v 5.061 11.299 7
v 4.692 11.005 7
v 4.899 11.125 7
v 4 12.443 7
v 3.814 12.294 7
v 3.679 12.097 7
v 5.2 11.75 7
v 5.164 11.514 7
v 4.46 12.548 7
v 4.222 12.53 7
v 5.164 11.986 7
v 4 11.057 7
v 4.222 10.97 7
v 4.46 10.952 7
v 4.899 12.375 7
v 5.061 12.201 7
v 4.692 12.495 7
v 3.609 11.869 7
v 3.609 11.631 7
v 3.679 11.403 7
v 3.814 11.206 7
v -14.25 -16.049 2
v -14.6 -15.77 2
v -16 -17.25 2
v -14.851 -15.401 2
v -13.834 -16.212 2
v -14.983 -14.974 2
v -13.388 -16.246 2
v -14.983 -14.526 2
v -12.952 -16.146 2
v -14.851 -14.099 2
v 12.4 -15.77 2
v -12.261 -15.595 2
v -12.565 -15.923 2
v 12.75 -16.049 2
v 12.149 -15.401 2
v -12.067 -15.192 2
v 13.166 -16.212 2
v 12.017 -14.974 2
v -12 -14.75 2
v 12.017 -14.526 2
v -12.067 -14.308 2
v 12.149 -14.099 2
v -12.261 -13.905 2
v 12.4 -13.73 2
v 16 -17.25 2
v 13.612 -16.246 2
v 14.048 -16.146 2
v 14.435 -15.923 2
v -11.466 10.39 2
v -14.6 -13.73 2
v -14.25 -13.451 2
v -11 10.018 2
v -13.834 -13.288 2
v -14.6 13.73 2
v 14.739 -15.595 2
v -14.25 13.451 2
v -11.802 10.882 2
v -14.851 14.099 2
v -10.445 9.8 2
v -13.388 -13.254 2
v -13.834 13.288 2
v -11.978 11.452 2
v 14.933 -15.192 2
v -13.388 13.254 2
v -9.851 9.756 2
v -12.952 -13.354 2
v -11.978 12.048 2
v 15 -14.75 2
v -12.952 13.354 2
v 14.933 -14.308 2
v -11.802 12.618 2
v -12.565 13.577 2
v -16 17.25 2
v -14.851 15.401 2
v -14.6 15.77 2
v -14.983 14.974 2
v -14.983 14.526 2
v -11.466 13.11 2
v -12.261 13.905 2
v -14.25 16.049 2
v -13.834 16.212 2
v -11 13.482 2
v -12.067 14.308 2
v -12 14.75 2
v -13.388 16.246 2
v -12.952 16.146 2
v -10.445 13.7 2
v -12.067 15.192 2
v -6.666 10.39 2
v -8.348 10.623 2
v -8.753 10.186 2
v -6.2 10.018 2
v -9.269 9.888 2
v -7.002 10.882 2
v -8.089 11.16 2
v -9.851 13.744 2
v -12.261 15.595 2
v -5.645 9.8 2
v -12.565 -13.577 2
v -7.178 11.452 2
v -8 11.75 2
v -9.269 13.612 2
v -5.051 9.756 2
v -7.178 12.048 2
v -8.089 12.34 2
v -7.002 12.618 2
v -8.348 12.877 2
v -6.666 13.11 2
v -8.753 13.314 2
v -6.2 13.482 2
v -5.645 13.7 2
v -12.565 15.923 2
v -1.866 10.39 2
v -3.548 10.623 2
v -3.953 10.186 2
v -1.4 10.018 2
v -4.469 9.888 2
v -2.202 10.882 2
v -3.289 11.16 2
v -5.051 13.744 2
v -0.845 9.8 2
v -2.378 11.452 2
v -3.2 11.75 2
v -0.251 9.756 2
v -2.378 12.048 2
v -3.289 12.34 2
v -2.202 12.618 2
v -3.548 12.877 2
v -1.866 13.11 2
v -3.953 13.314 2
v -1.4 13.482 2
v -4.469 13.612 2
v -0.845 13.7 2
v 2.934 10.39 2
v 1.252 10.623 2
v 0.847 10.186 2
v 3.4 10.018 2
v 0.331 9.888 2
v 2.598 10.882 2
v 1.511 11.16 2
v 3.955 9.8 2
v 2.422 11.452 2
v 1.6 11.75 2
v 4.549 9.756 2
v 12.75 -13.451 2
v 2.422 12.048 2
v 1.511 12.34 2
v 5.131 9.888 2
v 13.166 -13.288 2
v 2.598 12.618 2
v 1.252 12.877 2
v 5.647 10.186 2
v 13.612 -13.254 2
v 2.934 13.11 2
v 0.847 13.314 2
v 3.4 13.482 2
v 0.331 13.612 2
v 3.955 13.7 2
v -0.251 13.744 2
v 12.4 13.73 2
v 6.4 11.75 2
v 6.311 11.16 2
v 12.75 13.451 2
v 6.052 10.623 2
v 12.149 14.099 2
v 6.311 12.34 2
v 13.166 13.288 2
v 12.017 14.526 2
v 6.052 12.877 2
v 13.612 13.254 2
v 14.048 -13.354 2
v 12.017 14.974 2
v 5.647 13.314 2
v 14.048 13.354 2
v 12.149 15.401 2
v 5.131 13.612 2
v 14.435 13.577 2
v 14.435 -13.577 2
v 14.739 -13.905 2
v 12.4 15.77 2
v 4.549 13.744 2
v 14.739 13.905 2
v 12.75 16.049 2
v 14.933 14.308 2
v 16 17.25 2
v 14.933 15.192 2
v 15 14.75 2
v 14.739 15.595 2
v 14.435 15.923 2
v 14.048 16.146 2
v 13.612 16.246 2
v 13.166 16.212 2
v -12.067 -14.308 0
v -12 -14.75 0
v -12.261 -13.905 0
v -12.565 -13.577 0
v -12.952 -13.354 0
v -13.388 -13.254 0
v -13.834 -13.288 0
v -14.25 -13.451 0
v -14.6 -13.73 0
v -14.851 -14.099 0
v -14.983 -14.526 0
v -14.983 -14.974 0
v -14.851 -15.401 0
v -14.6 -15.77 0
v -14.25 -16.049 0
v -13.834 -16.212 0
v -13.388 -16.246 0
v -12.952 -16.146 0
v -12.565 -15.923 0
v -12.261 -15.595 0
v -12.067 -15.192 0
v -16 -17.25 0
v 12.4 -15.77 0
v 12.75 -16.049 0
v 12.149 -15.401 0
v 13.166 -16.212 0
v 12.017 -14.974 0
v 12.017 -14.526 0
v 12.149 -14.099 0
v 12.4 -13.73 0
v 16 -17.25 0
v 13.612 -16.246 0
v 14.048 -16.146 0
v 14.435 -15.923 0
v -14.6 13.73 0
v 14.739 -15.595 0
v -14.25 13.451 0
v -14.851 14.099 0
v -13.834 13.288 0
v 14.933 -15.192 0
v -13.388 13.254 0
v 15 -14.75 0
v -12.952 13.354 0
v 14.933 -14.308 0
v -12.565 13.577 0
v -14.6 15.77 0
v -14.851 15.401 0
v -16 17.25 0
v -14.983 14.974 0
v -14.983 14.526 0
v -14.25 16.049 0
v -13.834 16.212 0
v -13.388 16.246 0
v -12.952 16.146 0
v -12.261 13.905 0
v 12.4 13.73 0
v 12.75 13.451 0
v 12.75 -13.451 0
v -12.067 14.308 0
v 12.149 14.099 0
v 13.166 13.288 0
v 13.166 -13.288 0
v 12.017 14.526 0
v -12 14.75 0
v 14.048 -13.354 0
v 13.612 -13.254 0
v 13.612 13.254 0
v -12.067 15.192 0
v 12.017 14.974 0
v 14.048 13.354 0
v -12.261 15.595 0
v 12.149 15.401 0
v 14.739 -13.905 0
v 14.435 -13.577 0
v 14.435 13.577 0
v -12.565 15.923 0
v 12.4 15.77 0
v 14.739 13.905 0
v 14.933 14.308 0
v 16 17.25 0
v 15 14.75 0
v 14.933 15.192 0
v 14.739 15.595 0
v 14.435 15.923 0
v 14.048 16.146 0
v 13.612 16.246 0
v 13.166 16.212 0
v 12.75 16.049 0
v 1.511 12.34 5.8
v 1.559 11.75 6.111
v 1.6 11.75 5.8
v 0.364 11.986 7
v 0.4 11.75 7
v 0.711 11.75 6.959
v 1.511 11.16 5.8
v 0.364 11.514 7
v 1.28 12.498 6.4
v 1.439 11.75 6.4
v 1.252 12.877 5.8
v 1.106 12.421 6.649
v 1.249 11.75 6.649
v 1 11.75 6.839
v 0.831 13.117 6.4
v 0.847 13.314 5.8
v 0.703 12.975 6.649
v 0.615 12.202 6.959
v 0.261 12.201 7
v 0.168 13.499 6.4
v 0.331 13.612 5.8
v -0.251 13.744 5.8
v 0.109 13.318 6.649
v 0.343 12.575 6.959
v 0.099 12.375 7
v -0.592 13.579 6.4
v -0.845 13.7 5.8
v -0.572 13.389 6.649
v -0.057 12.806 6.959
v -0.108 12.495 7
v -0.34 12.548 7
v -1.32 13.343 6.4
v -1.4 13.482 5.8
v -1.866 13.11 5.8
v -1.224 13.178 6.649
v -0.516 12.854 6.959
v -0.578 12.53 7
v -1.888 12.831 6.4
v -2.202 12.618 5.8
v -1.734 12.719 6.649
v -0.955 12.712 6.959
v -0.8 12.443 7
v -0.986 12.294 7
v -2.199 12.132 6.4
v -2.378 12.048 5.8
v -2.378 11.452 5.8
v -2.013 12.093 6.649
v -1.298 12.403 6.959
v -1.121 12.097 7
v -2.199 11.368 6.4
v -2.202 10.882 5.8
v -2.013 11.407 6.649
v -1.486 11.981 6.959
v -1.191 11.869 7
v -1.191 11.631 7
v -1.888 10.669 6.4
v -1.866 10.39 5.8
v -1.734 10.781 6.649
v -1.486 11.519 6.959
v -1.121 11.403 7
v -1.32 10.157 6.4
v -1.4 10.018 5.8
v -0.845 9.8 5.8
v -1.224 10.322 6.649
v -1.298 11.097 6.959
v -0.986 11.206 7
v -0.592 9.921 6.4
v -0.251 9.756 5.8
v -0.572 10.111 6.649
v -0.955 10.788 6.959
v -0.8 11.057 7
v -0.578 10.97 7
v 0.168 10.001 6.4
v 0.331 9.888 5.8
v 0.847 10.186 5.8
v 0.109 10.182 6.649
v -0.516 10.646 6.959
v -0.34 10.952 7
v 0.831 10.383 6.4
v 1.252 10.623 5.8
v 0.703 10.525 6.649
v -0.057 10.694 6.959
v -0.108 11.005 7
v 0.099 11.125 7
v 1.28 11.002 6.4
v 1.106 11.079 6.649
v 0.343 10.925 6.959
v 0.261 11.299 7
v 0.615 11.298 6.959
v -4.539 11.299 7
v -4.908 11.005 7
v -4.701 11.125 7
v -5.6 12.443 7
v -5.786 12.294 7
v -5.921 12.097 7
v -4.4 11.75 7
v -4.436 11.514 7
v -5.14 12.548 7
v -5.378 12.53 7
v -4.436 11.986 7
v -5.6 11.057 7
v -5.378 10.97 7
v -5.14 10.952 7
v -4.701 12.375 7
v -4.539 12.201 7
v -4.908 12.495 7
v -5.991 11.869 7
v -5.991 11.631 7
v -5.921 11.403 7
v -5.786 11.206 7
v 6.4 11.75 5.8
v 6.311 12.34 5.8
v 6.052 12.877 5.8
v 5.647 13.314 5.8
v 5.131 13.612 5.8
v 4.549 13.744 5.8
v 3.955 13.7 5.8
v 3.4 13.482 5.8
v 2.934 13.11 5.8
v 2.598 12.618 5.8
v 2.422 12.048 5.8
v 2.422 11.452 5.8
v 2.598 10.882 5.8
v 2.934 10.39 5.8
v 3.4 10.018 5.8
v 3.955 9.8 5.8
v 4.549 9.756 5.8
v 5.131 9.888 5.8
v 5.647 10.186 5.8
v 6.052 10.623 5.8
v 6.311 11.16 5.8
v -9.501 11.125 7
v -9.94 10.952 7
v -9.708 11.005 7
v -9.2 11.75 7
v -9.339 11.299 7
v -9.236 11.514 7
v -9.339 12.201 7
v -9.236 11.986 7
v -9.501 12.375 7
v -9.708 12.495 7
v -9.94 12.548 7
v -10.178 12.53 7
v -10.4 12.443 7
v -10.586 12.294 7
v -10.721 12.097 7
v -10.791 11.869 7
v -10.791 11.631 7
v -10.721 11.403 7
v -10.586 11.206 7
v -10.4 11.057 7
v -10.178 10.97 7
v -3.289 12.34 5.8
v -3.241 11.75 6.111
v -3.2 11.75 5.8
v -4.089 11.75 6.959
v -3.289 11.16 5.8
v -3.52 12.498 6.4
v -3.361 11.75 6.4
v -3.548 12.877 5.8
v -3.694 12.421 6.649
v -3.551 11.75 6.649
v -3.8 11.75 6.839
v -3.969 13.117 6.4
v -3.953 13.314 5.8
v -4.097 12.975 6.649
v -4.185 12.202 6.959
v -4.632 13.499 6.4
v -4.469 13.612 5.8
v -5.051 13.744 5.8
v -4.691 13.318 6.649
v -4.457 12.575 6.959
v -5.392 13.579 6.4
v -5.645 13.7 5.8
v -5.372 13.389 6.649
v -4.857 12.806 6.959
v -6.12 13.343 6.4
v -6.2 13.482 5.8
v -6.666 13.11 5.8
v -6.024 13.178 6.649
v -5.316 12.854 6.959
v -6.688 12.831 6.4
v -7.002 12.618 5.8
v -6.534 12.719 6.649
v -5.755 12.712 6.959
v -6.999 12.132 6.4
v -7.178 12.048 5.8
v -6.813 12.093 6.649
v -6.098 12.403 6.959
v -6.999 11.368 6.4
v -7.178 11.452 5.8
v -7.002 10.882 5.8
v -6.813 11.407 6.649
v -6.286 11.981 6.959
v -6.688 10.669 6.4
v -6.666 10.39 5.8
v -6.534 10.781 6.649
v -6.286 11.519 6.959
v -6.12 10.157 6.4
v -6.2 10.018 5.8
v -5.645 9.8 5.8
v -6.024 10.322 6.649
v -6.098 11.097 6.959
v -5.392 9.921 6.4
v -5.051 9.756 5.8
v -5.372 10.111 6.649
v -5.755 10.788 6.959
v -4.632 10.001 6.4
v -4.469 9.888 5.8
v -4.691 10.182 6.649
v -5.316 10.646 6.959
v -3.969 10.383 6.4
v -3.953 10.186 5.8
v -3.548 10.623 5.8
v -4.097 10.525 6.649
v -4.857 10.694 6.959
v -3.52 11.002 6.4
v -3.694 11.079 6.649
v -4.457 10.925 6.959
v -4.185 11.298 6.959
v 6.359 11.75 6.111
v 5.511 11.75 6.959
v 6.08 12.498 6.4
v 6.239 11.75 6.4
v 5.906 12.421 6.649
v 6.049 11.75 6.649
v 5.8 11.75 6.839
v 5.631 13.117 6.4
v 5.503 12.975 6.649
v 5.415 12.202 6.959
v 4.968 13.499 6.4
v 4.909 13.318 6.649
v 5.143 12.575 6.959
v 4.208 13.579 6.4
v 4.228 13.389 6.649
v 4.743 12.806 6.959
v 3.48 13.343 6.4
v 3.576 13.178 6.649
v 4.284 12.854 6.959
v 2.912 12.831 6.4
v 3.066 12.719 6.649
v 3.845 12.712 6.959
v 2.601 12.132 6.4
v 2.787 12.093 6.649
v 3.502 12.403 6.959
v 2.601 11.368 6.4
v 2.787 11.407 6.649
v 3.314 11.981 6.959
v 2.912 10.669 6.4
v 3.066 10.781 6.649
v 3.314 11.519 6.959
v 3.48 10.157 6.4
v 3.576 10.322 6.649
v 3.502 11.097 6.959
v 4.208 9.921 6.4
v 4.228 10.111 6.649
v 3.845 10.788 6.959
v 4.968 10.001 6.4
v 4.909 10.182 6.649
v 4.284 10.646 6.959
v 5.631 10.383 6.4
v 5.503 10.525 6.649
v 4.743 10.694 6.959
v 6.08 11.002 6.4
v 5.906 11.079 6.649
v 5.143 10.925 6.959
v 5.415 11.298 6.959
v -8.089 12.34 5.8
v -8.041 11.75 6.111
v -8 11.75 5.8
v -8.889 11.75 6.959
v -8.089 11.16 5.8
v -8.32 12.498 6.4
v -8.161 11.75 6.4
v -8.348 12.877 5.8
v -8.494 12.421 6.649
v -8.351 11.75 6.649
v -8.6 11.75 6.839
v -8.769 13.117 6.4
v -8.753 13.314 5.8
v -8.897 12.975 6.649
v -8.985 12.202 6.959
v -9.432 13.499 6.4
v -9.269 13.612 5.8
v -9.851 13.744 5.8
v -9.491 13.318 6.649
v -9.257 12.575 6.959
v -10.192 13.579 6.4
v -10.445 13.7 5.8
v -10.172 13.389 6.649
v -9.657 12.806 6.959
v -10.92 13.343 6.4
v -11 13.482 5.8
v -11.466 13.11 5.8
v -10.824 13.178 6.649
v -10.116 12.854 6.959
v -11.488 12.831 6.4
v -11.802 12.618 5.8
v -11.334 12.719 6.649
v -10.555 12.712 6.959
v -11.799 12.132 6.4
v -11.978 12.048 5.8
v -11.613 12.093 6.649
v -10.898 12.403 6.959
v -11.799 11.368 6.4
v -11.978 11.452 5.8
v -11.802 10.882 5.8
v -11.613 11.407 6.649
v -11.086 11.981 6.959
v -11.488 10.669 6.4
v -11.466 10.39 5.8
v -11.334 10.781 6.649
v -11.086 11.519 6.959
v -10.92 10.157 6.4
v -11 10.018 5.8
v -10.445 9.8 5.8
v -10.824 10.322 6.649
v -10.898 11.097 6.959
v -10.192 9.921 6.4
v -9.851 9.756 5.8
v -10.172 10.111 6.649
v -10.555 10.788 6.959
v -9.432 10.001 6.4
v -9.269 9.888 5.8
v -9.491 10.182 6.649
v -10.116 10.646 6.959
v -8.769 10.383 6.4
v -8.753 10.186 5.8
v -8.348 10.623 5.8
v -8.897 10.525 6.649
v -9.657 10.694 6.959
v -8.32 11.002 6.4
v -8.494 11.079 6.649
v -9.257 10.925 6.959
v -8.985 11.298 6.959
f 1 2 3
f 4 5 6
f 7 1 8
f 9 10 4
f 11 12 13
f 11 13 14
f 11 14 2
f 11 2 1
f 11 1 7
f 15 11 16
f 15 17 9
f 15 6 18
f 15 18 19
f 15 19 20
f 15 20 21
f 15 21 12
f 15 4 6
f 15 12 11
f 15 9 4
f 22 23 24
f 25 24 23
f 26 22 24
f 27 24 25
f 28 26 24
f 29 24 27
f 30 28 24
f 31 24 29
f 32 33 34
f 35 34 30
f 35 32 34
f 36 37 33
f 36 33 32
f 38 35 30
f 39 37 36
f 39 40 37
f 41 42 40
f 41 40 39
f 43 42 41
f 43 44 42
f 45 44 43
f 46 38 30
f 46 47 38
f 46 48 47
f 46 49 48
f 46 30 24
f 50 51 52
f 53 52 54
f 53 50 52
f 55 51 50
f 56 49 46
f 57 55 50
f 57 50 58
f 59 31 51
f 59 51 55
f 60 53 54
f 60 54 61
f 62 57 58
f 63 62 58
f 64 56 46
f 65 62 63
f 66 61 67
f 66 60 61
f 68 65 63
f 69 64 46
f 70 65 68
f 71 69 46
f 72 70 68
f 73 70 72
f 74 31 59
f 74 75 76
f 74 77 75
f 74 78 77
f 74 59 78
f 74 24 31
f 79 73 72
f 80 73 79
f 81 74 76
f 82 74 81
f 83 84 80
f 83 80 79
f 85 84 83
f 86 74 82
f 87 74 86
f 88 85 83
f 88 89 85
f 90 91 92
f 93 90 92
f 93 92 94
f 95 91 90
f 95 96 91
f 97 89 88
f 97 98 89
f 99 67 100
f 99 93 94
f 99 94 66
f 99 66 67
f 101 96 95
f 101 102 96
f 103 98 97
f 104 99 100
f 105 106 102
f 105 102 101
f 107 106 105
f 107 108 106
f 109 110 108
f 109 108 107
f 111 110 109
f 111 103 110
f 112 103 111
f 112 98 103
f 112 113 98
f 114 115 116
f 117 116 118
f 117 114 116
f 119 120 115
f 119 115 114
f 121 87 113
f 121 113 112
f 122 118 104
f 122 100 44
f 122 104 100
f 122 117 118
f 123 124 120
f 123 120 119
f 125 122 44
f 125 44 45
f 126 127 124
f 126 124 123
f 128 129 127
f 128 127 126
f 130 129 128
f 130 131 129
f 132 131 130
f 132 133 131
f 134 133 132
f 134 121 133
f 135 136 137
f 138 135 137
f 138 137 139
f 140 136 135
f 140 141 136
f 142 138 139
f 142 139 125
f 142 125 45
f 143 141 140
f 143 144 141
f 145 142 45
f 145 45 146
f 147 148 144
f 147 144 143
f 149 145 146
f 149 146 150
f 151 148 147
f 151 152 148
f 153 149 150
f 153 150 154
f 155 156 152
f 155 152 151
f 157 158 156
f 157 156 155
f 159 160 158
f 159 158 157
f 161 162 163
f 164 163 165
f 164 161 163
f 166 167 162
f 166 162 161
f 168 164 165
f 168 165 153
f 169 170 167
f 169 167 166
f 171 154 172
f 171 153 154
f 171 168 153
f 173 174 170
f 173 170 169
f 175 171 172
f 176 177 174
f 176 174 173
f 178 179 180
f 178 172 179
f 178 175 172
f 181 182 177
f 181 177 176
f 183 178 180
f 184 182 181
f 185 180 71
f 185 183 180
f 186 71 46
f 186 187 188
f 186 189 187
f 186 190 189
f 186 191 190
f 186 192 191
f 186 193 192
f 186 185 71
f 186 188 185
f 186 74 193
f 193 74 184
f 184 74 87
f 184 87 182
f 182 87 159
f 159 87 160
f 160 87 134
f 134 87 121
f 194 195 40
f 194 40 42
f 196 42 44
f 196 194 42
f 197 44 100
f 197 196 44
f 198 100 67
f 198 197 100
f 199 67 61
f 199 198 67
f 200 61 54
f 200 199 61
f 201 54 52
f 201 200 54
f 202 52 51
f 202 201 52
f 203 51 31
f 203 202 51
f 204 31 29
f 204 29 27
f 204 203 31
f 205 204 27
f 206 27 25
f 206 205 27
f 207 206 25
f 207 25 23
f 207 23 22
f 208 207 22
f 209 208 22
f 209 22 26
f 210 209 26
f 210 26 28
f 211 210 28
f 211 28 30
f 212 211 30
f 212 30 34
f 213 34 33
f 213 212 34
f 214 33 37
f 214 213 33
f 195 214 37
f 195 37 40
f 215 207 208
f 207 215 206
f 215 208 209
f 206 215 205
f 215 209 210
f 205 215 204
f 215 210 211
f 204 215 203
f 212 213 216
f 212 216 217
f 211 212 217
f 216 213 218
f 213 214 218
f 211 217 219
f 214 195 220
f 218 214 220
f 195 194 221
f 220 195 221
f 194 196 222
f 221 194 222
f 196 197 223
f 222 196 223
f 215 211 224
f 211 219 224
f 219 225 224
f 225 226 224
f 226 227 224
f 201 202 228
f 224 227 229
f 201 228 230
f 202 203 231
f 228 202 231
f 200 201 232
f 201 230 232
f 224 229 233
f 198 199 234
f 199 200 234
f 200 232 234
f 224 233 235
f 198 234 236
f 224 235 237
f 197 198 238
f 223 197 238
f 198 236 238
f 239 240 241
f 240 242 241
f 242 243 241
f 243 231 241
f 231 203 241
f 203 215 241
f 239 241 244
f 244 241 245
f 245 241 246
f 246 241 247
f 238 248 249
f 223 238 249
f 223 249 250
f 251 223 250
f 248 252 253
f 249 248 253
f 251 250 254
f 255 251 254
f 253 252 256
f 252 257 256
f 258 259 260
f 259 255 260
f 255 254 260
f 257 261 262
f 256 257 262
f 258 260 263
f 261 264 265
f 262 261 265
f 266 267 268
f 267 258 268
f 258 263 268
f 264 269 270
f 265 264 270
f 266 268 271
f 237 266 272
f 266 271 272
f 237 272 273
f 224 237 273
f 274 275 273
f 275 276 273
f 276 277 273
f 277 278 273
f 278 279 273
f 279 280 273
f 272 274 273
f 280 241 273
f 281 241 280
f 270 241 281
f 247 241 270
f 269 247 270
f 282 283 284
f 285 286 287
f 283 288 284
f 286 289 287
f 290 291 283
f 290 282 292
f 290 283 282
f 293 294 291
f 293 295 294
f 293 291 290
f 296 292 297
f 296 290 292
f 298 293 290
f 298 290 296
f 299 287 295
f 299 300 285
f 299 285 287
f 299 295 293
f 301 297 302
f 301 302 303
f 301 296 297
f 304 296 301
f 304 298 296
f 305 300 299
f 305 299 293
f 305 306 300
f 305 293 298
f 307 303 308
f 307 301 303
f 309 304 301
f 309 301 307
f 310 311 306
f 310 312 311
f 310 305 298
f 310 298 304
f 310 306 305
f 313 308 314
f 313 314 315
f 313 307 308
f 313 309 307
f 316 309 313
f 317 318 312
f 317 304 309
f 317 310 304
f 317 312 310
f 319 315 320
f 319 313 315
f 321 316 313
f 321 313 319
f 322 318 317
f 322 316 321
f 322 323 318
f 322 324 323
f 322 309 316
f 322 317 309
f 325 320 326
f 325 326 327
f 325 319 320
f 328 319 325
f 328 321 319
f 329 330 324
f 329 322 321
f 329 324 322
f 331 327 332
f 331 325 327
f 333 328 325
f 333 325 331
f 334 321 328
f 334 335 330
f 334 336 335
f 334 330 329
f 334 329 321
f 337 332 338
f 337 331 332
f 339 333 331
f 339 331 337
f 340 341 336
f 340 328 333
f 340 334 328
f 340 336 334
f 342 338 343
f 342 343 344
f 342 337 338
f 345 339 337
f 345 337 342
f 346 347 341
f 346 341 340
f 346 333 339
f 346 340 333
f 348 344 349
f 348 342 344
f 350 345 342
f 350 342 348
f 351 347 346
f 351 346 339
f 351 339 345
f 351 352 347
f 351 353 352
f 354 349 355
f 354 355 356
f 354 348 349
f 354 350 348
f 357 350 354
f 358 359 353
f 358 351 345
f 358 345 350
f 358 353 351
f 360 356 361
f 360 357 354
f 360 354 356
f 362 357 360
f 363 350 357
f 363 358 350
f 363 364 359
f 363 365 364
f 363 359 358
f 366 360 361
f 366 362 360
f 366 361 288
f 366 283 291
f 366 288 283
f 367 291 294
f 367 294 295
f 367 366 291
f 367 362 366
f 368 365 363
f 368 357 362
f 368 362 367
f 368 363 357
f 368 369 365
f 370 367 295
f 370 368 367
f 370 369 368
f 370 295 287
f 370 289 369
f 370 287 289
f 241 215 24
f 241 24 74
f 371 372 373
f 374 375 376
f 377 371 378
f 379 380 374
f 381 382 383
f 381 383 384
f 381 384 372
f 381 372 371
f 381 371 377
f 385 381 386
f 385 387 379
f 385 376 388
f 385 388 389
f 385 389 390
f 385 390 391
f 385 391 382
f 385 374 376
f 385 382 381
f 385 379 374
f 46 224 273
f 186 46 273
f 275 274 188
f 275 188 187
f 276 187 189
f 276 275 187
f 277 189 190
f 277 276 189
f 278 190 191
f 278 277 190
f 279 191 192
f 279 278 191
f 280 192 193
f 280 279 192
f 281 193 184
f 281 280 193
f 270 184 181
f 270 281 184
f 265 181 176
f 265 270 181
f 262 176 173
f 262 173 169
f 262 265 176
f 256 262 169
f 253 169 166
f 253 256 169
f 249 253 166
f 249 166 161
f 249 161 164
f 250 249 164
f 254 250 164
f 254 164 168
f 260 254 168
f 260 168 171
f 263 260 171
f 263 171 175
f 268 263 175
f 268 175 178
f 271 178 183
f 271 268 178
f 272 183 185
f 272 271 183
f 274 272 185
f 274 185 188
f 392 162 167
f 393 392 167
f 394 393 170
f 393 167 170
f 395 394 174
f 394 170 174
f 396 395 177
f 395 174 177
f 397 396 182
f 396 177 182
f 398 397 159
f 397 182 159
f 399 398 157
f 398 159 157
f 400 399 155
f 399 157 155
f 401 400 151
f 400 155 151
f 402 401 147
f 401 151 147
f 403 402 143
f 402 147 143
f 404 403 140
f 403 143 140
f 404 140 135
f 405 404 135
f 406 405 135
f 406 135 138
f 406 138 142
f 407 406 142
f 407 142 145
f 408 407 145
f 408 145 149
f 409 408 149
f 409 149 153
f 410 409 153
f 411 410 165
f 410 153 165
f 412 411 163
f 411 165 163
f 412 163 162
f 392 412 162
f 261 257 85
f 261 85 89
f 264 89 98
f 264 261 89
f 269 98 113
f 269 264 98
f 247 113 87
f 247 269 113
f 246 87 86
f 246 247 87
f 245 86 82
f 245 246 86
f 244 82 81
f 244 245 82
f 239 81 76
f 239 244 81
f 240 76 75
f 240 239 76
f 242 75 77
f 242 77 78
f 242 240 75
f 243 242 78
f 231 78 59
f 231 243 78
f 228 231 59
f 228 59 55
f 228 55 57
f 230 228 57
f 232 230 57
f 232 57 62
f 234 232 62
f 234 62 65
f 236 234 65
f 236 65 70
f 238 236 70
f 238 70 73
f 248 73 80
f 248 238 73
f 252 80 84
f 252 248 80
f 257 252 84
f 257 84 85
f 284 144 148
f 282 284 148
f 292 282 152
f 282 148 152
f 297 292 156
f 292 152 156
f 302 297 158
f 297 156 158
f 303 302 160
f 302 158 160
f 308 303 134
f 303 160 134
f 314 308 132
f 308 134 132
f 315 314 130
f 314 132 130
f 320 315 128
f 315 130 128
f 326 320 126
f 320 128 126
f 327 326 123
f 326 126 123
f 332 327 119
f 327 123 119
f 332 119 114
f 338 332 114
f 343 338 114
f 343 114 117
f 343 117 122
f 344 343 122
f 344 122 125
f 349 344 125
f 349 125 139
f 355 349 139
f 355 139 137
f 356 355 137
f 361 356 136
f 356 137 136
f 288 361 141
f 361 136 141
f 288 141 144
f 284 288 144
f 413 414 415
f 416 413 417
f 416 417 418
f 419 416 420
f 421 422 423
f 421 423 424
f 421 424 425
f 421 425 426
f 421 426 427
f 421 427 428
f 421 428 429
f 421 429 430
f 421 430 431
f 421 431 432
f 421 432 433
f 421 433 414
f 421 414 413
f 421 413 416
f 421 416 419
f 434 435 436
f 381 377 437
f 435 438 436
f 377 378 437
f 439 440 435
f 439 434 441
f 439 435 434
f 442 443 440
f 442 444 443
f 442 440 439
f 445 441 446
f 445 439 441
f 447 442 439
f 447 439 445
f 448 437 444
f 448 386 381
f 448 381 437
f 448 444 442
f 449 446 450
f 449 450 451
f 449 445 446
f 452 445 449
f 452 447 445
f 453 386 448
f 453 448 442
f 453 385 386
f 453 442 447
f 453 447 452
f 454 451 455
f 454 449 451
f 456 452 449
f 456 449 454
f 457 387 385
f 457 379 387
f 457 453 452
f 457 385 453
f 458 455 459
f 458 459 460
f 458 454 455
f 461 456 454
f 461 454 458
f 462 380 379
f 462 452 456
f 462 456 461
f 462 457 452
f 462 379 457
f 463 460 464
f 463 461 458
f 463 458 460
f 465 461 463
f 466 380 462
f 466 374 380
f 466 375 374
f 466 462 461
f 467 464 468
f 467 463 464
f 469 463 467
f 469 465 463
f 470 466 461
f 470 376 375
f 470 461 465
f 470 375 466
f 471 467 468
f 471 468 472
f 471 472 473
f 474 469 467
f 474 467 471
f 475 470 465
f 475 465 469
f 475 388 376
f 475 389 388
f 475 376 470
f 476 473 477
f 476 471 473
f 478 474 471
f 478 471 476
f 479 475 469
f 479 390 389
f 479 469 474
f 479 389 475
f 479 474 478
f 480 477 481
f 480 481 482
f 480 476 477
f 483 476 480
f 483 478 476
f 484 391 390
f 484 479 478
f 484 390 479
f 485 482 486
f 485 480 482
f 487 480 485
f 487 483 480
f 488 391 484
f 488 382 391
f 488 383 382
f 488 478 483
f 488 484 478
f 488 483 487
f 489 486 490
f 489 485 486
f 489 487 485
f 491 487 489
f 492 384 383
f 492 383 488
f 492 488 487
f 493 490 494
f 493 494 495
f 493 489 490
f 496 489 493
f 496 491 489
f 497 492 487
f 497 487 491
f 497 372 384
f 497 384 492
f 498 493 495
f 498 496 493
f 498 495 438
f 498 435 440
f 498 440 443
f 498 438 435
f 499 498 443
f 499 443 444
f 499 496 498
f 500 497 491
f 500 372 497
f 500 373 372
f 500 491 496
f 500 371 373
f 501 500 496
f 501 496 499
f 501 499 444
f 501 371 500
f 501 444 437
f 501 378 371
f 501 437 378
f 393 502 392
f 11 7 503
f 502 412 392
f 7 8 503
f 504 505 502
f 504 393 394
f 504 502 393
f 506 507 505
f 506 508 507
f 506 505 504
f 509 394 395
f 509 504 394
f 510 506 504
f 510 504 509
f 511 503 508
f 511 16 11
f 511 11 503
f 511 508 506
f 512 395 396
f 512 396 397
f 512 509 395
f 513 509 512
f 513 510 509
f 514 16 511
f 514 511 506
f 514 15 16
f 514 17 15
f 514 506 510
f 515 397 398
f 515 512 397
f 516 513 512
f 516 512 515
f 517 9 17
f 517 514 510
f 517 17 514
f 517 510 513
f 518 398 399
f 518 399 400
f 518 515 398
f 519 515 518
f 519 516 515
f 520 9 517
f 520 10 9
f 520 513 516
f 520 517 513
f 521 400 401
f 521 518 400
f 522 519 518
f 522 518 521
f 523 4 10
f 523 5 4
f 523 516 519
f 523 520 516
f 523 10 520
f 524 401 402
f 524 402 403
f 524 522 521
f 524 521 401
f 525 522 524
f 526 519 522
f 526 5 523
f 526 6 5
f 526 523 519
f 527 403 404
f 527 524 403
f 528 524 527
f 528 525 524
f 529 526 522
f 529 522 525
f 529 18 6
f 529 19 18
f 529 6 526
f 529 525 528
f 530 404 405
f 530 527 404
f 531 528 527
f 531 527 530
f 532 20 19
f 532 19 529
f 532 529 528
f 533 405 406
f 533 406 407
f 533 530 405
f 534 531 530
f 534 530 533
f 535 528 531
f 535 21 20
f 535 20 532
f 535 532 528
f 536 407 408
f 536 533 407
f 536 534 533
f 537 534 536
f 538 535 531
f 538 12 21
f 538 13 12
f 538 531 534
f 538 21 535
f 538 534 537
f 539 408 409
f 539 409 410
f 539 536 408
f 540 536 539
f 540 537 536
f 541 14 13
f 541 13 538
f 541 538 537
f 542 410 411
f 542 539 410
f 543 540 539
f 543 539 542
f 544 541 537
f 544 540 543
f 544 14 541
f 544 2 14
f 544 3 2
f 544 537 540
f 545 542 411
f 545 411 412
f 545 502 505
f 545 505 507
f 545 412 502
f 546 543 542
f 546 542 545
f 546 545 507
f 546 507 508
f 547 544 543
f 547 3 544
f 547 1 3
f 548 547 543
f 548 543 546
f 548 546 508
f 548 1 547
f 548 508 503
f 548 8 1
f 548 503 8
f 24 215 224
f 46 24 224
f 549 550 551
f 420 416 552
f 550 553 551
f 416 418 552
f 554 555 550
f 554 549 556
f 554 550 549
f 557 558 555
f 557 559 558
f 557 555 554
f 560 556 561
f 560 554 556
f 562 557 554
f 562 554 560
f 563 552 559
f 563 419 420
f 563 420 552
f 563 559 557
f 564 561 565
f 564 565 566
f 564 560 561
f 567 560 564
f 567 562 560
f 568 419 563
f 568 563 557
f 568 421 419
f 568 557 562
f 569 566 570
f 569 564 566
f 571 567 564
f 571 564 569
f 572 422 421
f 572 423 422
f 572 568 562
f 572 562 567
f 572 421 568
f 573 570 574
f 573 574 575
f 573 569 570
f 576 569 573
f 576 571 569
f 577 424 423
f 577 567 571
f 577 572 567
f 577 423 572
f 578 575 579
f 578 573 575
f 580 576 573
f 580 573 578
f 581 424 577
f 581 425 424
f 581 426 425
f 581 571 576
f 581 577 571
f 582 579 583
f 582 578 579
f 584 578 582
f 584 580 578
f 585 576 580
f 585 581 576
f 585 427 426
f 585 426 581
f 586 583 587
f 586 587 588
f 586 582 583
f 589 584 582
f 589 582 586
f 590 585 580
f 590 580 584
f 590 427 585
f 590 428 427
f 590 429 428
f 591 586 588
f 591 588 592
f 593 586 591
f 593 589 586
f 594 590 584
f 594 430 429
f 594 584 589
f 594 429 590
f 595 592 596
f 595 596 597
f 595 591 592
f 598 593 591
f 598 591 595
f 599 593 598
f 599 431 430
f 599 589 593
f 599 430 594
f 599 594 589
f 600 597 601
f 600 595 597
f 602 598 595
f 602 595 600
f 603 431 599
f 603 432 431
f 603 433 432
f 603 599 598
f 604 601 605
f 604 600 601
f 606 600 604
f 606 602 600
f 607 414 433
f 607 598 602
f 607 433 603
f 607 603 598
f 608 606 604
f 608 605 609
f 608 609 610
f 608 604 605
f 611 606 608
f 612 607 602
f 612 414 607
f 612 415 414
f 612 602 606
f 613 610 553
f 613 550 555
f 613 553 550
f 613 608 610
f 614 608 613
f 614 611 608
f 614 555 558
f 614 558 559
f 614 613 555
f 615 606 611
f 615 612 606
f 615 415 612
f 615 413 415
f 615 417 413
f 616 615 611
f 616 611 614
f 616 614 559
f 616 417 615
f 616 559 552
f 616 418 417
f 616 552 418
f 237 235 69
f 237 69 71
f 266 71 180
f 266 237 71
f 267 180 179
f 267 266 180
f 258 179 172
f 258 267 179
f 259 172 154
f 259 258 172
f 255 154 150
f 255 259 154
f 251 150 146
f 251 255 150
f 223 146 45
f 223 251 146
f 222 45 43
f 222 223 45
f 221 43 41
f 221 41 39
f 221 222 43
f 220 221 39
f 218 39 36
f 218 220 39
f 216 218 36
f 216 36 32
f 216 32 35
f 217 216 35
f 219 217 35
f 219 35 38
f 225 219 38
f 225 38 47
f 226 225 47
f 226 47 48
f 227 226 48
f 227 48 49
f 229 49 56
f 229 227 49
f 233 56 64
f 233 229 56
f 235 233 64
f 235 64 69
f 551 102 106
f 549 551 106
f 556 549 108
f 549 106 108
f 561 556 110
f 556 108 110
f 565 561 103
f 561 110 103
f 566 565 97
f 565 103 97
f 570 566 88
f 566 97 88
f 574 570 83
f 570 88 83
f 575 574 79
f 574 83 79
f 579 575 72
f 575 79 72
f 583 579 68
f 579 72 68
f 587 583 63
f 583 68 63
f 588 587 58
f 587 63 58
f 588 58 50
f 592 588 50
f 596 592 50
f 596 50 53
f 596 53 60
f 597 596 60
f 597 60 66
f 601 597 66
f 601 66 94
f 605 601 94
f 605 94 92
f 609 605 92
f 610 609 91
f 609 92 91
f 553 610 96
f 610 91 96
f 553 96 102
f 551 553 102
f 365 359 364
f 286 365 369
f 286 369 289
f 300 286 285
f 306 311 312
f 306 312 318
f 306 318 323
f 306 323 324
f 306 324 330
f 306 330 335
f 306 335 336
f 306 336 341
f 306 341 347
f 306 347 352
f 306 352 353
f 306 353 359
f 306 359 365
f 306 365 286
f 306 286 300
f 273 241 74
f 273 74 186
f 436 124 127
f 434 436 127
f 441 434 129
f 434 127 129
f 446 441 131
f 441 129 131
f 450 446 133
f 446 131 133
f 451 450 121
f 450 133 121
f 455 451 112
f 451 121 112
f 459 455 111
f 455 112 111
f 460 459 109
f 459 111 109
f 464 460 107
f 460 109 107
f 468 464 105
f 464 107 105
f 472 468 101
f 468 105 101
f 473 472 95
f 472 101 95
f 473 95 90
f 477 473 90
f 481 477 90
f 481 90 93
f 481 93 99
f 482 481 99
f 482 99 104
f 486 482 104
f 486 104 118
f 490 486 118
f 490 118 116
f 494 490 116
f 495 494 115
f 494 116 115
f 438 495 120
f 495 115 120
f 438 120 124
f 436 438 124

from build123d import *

# Parameters (mm, degrees)
SKETCH1_W           = 32
SKETCH1_H           = 34.5
SKETCH1_R           = 1.5
BOSS_EXTRUDE1_DEPTH = 2
SKETCH2_R           = 2
BOSS_EXTRUDE2_DEPTH = 5
FILLET1_R           = 1.2


with BuildPart() as part:
    # Sketch1 → Boss-Extrude1 (new body)
    with BuildSketch(Plane.XY):
        Rectangle(SKETCH1_W, SKETCH1_H)
        with Locations((-13.5, 14.75)):
            Circle(SKETCH1_R, mode=Mode.SUBTRACT)
        with Locations((13.5, 14.75)):
            Circle(SKETCH1_R, mode=Mode.SUBTRACT)
        with Locations((-13.5, -14.75)):
            Circle(SKETCH1_R, mode=Mode.SUBTRACT)
        with Locations((13.5, -14.75)):
            Circle(SKETCH1_R, mode=Mode.SUBTRACT)
    extrude(amount=BOSS_EXTRUDE1_DEPTH)

    # Sketch2 → Boss-Extrude2 (add)
    with BuildSketch(Plane.XY.offset(2)):
        with Locations((-10, 11.75)):
            Circle(SKETCH2_R)
        with Locations((-5.2, 11.75)):
            Circle(SKETCH2_R)
        with Locations((-0.4, 11.75)):
            Circle(SKETCH2_R)
        with Locations((4.4, 11.75)):
            Circle(SKETCH2_R)
    extrude(amount=BOSS_EXTRUDE2_DEPTH)

    # Fillet1
    fillet1_edges = [part.edges().sort_by_distance(p)[0] for p in [
        (-12, 11.75, 7),
        (-7.2, 11.75, 7),
        (-2.4, 11.75, 7),
        (2.4, 11.75, 7),
    ]]
    fillet(fillet1_edges, radius=FILLET1_R)


solid = part.part
